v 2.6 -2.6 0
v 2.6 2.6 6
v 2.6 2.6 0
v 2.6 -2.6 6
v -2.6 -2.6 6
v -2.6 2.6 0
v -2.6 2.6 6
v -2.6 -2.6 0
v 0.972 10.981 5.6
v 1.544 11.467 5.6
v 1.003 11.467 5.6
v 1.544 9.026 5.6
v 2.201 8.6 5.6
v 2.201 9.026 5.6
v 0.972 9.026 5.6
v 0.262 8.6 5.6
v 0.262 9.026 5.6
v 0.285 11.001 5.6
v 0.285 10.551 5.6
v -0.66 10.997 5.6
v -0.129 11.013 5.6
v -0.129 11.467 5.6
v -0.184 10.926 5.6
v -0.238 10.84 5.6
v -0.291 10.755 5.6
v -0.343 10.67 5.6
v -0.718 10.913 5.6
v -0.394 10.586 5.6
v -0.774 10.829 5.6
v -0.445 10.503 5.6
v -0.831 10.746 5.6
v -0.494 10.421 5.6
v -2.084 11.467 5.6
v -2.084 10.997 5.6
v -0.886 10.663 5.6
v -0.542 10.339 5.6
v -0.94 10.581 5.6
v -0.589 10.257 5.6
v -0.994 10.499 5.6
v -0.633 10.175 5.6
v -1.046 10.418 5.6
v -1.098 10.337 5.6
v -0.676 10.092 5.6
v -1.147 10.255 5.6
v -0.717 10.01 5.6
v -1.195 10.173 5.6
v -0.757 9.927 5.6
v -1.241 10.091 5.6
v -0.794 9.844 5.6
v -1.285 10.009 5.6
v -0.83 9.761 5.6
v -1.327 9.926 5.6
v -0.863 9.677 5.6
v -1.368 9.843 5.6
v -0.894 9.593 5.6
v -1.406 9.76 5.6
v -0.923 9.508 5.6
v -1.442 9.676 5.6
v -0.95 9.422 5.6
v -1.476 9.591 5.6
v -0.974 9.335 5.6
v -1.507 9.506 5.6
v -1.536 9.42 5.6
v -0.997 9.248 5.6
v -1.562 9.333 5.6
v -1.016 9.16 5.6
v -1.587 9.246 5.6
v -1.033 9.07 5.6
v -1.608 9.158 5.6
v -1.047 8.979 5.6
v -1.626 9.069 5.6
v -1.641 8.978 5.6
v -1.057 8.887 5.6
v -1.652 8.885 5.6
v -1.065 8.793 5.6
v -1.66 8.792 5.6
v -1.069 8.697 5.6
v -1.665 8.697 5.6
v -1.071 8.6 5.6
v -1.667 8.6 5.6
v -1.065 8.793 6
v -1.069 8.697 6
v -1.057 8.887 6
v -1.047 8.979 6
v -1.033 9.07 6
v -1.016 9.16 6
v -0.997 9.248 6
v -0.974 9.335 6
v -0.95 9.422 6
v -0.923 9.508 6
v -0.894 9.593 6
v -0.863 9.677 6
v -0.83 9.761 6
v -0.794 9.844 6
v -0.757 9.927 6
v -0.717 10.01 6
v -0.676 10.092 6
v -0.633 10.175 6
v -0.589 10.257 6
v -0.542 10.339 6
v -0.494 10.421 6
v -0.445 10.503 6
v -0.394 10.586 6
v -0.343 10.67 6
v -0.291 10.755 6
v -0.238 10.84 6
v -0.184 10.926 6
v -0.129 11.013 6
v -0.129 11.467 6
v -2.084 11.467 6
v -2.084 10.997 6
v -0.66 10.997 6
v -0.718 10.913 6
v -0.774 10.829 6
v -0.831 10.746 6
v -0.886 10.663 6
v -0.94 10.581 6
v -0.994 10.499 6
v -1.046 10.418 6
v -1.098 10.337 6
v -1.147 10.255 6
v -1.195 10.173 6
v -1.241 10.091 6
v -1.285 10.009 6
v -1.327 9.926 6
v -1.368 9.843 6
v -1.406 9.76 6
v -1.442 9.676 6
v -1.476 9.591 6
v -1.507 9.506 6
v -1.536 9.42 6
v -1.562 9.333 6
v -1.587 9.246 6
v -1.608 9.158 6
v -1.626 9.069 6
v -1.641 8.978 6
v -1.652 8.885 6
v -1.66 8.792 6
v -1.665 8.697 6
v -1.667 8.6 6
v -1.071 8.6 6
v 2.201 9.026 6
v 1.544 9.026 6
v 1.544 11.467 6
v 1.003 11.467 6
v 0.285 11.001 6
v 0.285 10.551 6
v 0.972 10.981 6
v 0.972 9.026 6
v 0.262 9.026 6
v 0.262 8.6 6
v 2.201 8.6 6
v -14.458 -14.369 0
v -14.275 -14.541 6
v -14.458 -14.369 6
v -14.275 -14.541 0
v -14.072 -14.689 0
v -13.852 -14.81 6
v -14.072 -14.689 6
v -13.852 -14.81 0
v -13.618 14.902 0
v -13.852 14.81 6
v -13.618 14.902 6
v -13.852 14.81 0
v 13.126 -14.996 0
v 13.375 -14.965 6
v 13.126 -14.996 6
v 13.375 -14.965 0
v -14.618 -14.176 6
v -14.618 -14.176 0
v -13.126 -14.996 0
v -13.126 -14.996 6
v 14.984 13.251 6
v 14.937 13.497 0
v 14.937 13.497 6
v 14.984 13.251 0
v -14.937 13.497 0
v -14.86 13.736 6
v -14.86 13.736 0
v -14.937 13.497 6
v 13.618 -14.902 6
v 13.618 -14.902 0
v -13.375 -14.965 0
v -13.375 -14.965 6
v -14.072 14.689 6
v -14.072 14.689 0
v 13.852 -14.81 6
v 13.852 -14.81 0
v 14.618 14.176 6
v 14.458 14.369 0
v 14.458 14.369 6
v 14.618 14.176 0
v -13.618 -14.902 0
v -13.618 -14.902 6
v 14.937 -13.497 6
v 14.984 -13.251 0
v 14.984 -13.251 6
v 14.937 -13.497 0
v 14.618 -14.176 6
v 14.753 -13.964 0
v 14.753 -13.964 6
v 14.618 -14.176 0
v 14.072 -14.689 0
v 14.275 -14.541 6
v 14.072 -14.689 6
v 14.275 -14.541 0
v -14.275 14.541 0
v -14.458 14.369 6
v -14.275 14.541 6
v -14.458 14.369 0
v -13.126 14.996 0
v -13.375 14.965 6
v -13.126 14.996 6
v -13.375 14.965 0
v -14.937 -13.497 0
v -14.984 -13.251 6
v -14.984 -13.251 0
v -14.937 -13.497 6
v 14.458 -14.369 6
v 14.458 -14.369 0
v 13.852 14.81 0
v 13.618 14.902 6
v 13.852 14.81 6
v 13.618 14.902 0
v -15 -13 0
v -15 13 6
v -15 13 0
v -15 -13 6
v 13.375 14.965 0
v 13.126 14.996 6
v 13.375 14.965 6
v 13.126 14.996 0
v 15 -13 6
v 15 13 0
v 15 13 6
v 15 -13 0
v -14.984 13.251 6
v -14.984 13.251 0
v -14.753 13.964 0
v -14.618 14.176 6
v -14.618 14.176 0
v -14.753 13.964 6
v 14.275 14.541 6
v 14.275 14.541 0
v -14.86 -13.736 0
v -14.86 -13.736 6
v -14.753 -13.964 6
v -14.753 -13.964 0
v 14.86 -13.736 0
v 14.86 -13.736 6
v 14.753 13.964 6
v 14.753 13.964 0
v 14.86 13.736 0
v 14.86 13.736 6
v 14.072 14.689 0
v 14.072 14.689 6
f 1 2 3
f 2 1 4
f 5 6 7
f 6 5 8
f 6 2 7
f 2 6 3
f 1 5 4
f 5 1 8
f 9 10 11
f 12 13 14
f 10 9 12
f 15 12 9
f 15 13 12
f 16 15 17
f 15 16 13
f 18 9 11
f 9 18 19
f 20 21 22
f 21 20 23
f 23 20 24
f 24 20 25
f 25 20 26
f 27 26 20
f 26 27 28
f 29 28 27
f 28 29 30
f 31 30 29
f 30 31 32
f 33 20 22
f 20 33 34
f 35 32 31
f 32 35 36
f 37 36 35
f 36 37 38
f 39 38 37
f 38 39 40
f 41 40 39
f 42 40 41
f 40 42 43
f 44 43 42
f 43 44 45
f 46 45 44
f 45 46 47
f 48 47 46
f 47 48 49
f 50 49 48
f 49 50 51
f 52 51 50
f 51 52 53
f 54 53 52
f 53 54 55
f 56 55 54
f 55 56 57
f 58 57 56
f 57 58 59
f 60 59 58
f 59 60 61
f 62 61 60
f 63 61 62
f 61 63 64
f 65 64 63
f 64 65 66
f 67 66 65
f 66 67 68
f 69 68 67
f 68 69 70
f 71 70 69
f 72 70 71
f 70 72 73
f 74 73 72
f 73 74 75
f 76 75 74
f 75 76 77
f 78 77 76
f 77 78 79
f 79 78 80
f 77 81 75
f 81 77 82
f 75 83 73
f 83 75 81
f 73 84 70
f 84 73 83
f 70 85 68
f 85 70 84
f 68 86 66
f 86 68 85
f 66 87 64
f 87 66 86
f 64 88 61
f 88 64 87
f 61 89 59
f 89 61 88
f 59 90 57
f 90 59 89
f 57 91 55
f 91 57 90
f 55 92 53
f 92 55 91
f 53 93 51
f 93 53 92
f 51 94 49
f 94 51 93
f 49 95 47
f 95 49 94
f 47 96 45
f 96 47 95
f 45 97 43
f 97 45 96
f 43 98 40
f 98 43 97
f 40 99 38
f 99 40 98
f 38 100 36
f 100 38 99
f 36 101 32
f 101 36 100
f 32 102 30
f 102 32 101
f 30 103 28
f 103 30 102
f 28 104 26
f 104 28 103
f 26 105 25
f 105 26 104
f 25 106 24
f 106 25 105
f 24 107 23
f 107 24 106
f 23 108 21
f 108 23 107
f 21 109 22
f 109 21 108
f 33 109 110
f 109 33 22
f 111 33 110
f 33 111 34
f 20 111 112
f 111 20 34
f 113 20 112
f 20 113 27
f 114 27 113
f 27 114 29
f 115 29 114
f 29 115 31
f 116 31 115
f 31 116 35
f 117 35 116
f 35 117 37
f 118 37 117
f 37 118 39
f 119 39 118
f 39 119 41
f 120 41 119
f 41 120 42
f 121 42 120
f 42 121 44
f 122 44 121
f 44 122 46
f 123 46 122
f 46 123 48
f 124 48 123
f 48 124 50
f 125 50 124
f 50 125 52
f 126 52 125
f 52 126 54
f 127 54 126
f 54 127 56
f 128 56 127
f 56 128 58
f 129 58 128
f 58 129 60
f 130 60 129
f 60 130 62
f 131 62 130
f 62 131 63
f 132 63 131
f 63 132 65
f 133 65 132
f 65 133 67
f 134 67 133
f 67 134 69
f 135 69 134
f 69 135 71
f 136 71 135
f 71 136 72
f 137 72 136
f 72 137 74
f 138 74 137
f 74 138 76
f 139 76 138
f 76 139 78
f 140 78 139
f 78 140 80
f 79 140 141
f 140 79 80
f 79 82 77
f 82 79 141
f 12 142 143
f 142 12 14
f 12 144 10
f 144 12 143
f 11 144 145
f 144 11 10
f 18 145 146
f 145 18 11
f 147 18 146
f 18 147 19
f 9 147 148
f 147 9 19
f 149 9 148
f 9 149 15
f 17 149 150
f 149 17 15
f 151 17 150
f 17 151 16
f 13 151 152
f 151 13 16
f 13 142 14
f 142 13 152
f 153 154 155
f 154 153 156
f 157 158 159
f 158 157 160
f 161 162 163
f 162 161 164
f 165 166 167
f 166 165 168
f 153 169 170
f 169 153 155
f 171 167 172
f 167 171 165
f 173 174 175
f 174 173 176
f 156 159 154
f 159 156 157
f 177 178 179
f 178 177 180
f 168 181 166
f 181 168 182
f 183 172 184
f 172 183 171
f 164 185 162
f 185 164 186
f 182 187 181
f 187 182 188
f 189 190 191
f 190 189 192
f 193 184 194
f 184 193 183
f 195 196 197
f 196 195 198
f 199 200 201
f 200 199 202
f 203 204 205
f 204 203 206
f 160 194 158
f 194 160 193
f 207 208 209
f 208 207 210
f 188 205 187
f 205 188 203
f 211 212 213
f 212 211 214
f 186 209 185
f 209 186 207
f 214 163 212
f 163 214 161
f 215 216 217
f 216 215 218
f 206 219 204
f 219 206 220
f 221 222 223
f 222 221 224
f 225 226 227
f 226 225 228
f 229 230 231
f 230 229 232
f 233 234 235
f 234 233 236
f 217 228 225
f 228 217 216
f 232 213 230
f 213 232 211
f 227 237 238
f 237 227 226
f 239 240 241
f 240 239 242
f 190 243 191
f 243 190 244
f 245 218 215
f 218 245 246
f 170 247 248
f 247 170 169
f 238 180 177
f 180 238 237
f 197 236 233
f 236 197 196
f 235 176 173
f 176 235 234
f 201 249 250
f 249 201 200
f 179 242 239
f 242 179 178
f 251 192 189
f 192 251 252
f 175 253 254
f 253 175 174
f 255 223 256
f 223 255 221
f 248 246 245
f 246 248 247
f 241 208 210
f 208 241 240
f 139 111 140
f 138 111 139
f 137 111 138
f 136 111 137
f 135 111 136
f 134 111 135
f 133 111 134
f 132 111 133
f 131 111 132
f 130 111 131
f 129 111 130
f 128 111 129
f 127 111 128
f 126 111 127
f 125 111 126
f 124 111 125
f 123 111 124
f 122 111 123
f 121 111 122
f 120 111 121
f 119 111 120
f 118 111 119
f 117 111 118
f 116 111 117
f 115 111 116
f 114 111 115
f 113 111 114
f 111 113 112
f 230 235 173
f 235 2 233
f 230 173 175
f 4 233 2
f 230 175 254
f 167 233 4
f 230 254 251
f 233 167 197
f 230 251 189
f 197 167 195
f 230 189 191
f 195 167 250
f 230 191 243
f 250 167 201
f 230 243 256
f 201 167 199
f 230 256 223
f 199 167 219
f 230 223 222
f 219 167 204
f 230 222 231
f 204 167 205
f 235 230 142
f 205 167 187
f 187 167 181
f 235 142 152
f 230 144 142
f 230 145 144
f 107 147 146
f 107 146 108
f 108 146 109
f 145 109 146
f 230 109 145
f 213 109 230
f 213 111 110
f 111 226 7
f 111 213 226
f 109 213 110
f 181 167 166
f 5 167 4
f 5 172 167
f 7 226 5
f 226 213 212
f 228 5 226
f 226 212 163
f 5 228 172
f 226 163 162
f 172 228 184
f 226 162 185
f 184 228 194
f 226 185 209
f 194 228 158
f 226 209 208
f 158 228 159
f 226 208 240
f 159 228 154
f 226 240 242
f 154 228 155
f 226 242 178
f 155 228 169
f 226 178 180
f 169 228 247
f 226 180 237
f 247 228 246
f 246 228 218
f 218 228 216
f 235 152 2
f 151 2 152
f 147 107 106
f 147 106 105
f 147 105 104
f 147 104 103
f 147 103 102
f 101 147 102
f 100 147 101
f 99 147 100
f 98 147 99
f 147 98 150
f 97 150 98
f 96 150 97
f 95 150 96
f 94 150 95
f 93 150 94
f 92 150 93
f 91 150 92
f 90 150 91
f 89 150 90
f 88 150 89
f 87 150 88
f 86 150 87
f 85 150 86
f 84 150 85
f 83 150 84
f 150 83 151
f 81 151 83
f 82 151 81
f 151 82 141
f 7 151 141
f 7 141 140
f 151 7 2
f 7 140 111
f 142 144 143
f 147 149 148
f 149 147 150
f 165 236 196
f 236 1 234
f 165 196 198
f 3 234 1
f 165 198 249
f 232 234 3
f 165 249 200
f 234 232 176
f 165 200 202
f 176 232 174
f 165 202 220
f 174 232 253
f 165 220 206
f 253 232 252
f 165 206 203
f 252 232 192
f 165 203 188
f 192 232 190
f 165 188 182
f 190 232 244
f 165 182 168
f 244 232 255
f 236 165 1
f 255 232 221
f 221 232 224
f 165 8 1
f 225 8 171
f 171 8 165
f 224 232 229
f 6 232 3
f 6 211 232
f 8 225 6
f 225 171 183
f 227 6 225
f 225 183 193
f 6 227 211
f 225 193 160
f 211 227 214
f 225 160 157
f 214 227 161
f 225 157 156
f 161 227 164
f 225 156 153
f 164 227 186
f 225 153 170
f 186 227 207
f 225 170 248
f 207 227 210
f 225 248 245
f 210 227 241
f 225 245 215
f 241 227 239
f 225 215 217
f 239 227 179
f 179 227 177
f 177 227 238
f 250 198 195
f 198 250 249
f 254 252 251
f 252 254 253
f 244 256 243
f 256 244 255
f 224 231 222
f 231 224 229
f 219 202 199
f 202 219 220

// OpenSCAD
$fn = 50;

difference() {
	union() {
		translate(v = [0, 0, 0]) {
			rotate(a = [0, 0, 0]) {
				difference() {
					union() {
						hull() {
							translate(v = [-13.0, 13.0, 0]) {
								cylinder(h = 6.0, r = 2);
							}
							translate(v = [13.0, 13.0, 0]) {
								cylinder(h = 6.0, r = 2);
							}
							translate(v = [-13.0, -13.0, 0]) {
								cylinder(h = 6.0, r = 2);
							}
							translate(v = [13.0, -13.0, 0]) {
								cylinder(h = 6.0, r = 2);
							}
						}
					}
					union() {
						translate(v = [-2.6, -2.6, -0.1]) {
							cube(size = [5.2, 5.2, 6.2]);
						}
						translate(v = [0.0, 10, 5.6]) {
							linear_extrude(height = 0.5) {
								text(font = "Arial:style=Bold", halign = "center", size = 3, text = "71", valign = "center");
							}
						}
					}
				}
			}
		}
	}
	union();
}
